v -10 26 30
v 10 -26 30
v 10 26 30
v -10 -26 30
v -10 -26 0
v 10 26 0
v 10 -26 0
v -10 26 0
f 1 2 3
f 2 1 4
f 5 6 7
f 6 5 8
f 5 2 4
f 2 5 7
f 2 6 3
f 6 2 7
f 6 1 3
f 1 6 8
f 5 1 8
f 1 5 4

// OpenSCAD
// PRUSA iteration3
// Bearing holders
// GNU GPL v3
// Josef Průša <iam@josefprusa.cz> and contributors
// http://www.reprap.org/wiki/Prusa_Mendel
// http://prusamendel.org

bearing_diameter = 15;

module nut(nut_diameter=6.6,nut_height=3){
	cylinder(r=nut_diameter/2,h=2*nut_height,$fn=6,center=true);
}

module horizontal_bearing_base(bearings=1){
 translate(v=[0,0,30/2]) cube(size = [20,4+bearings*24,30], center = true);	
}
module horizontal_bearing_holes(bearings=1){
 cutter_lenght = 10+bearings*25;
 one_holder_lenght = 8+25;
 holder_lenght = 8+bearings*25;
    
 base_size = 4+bearings*24;
 
 // Main bearing cut
 /*difference(){
  translate(v=[0,0,12+1.5]) rotate(a=[90,0,0]) translate(v=[0,0,-cutter_lenght/2]) cylinder(h = cutter_lenght, r=bearing_diameter/2, $fn=50);
  
  // Bearing retainers
  translate(v=[0,1.5-holder_lenght/2,3+1.5]) cube(size = [24,6,8], center = true);
  translate(v=[0,-1.5+holder_lenght/2,3+1.5]) cube(size = [24,6,8], center = true);
 }*/
 //translate([0, 0, 40]) cube(size=[15/2, cutter_lenght, 50], center=true);
 /*for (i = [0:bearings-1]) {
     translate([0, base_size/-2+2+12+i*24, 26]) rotate(a=[90, 0, 90]) cylinder(d=3.3, h=100, $fn=16, center=true);
     
     translate([-9, base_size/-2+2+12+i*24, 26]) rotate(a=[90, 0, 90]) nut(6.6, 2.5);
     
     translate([9, base_size/-2+2+12+i*24, 26]) rotate(a=[90, 0, 90]) cylinder(d=7, h=5, $fn=32, center=true);
 }*/
 
 
 // Ziptie cutouts
 /*ziptie_cut_ofset = 0;
 for ( i = [0 : bearings-1] ){
  // For easier positioning I move them by half of one 
  // bearing holder then add each bearign lenght and then center again
  translate(v=[0,-holder_lenght/2,0]) translate(v=[0,one_holder_lenght/2+i*25,0]) difference(){
   union(){
    translate(v=[0,2-6,12]) rotate(a=[90,0,0]) translate(v=[0,0,0]) cylinder(h = 4, r=12.5, $fn=50);
    translate(v=[0,2+6,12]) rotate(a=[90,0,0]) translate(v=[0,0,0]) cylinder(h = 4, r=12.5, $fn=50);
   }
   translate(v=[0,10,12]) rotate(a=[90,0,0]) translate(v=[0,0,0]) cylinder(h = 24, r=10, $fn=50);
  }
 }*/
 
}

module horizontal_bearing_test(){
 difference(){
  horizontal_bearing_base(1);
  horizontal_bearing_holes(1);
 }
 translate(v=[30,0,0]) difference(){
  horizontal_bearing_base(2);
  horizontal_bearing_holes(2);
 }
 translate(v=[60,0,0]) difference(){
  horizontal_bearing_base(3);
  horizontal_bearing_holes(3);
 }
}



thinwall = 3;
bearing_size = bearing_diameter + 2 * thinwall;

module vertical_bearing_base(){
 translate(v=[-2-bearing_size/4,0,29]) cube(size = [4+bearing_size/2,bearing_size,58], center = true);
 cylinder(h = 58, r=bearing_size/2, $fn = 90);
}

module vertical_bearing_holes(){
  translate(v=[0,0,-1]) cylinder(h = 62, r=bearing_diameter/2, $fn = 60);
  rotate(a=[0,0,90]) translate(v=[-8.5,0,30.5]) cube(size = [5,3,62], center = true);
}

/*difference(){
vertical_bearing_base();
vertical_bearing_holes();
}*/

horizontal_bearing_base(2);
